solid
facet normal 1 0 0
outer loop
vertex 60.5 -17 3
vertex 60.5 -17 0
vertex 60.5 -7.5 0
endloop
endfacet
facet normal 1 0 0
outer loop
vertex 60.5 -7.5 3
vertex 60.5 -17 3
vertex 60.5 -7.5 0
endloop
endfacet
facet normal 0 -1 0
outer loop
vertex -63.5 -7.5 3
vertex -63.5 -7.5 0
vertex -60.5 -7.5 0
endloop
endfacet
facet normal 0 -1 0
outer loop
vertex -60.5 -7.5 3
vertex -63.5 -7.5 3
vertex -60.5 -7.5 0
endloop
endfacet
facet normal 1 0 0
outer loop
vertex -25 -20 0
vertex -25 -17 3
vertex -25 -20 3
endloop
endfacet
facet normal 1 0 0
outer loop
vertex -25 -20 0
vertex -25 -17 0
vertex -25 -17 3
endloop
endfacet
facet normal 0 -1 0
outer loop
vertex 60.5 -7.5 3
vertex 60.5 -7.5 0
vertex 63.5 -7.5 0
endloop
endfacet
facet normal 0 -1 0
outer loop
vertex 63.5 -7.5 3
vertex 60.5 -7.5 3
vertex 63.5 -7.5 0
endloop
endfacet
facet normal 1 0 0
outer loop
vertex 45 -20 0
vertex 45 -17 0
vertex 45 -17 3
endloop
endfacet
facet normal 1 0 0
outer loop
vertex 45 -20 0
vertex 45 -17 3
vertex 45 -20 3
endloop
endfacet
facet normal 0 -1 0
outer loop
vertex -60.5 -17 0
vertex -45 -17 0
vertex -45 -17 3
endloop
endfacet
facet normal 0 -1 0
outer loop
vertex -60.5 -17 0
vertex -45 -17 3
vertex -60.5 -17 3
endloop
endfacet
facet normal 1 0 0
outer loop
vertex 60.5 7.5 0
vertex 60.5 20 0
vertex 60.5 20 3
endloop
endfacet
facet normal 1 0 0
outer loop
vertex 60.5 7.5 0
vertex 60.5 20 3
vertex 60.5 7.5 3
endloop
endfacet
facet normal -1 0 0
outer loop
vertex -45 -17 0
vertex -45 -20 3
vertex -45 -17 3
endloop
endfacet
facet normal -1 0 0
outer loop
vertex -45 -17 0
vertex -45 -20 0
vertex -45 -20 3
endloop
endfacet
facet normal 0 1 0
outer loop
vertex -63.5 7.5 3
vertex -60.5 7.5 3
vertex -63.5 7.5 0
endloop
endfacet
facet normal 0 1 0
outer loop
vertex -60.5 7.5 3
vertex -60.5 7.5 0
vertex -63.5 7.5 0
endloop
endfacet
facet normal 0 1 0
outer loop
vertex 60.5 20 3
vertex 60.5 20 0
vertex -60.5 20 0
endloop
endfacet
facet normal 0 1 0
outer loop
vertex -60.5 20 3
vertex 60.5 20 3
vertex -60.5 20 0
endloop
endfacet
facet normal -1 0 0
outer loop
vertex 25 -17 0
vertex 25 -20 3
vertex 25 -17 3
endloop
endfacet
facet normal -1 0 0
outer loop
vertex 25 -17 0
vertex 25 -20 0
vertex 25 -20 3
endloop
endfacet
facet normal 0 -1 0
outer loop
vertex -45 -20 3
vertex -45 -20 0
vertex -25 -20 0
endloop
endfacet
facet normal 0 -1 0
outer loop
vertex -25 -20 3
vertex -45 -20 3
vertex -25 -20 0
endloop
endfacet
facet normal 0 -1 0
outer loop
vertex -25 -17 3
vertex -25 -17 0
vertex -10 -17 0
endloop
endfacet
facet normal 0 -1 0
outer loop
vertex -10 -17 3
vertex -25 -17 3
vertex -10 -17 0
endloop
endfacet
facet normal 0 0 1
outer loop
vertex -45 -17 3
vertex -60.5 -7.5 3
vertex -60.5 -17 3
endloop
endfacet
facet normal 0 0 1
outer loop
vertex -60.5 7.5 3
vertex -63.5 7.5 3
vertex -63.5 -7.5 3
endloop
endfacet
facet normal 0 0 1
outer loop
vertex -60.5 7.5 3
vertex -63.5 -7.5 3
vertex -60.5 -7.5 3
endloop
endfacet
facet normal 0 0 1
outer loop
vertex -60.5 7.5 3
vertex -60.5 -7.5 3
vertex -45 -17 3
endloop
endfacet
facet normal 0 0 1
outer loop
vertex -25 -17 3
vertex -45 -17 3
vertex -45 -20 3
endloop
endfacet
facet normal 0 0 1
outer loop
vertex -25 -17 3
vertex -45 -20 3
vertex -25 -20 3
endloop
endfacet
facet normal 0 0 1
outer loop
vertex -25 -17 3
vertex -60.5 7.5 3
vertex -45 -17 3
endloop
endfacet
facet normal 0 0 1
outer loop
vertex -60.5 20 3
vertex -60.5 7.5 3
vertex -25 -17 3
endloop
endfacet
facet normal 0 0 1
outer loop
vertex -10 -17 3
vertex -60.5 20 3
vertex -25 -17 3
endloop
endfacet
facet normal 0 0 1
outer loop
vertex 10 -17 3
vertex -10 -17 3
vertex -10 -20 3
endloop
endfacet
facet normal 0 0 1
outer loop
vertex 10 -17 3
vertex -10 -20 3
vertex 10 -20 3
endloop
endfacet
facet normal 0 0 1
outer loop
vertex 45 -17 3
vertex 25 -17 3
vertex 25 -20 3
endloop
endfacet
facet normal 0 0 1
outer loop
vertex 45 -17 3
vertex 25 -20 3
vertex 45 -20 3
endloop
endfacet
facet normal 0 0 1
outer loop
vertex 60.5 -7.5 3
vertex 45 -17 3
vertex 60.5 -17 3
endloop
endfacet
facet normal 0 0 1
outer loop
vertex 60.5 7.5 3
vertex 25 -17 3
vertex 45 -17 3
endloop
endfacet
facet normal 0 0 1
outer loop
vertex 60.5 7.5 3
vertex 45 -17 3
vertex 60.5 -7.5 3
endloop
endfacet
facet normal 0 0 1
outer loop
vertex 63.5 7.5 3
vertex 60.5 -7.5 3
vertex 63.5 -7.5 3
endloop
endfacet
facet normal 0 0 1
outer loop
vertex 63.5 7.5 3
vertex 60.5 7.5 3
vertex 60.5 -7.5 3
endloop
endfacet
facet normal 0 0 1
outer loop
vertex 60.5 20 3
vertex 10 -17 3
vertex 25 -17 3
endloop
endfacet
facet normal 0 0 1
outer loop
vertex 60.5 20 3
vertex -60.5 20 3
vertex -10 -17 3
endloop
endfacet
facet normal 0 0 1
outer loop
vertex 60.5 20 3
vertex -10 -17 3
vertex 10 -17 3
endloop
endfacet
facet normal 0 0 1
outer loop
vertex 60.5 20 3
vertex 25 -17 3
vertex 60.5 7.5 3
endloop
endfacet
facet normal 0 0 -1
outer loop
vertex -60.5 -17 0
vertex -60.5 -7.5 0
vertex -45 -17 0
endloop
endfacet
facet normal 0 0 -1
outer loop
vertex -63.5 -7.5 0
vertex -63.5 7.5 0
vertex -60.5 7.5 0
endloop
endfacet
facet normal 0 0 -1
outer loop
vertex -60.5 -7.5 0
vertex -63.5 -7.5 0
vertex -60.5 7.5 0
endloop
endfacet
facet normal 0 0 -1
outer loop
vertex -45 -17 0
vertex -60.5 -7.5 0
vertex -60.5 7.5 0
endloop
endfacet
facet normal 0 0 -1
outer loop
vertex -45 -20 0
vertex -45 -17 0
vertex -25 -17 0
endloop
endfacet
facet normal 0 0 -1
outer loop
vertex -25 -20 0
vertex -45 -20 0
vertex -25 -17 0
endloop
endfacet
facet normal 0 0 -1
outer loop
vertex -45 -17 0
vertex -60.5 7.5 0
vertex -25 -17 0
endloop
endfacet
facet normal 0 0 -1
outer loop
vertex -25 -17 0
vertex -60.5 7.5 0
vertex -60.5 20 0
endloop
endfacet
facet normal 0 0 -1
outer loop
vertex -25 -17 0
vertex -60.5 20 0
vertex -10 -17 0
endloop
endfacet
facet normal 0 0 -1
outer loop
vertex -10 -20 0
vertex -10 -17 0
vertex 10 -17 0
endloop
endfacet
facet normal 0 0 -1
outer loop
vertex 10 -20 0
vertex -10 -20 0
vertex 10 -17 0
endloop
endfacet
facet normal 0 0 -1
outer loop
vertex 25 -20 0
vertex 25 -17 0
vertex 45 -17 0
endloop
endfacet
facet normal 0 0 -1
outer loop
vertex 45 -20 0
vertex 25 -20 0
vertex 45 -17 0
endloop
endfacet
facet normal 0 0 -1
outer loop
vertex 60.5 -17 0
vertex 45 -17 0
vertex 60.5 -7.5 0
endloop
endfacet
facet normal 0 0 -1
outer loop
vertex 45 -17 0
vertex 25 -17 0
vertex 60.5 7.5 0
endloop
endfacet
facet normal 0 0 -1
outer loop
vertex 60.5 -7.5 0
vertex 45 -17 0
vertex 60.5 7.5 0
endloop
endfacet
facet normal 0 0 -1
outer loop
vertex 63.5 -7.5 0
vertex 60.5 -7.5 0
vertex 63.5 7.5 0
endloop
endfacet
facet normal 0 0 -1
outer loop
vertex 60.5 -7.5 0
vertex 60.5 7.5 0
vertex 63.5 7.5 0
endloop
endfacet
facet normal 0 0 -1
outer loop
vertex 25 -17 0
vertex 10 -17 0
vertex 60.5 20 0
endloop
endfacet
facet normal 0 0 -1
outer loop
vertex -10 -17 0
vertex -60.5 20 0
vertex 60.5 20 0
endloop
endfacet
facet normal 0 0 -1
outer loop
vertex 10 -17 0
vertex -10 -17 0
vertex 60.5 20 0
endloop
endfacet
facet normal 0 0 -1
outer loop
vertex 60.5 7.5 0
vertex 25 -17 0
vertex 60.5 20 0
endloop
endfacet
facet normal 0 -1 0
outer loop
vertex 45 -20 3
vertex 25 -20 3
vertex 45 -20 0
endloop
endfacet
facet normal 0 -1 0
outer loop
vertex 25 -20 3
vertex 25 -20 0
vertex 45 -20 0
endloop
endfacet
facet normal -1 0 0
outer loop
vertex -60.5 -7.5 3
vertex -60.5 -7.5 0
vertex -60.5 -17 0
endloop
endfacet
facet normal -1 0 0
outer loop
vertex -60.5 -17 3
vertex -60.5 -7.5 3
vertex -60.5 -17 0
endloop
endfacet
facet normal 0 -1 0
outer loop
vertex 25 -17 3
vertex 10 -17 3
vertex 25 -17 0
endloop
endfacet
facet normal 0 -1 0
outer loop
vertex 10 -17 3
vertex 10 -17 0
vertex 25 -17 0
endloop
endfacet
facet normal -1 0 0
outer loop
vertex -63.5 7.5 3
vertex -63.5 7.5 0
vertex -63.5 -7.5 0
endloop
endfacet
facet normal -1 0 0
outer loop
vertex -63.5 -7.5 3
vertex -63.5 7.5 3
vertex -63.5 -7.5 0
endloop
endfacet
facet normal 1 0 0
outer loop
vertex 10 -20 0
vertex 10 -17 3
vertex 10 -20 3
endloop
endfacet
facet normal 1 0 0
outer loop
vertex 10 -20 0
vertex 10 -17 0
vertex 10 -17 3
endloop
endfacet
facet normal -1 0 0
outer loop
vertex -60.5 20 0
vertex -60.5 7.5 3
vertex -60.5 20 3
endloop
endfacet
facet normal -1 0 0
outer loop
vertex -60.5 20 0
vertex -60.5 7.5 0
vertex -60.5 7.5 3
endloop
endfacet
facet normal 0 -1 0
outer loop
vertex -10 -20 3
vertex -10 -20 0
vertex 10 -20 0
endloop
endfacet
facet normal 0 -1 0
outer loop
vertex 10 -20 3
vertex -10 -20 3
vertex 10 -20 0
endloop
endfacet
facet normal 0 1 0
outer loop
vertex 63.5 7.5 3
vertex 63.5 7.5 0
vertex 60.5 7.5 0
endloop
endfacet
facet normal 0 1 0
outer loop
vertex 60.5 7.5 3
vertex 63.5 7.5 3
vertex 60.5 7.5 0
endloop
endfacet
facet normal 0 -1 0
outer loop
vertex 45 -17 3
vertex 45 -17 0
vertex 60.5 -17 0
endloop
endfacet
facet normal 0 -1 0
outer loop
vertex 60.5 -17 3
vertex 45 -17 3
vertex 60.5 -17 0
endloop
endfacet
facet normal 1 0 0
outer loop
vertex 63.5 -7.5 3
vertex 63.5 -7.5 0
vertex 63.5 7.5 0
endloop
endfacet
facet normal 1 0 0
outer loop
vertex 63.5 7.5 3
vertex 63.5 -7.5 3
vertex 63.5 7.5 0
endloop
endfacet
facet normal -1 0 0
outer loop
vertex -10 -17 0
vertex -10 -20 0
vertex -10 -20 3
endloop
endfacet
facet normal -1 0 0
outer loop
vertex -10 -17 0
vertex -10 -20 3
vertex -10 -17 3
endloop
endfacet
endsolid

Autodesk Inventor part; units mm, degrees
ref_plane "YZ Plane" through (0, 0, 0) normal (1, 0, 0) x (0, 1, 0)
ref_plane "XZ Plane" through (0, 0, 0) normal (0, 1, 0) x (-1, 0, 0)
ref_plane "XY Plane" through (0, 0, 0) normal (0, 0, 1) x (1, 0, 0)
sketch "Sketch1" plane through (0, 0, 0) normal (0, 0, 1) x (1, 0, 0)
  line L0 (-63.5, -20) -> (63.5, -20)
  line L1 (63.5, -20) -> (63.5, 20)
  line L2 (63.5, 20) -> (-63.5, 20)
  line L3 (-63.5, 20) -> (-63.5, -20)
  line L4 (-63.5, -20) -> (63.5, 20) construction
  line L5 (63.5, -20) -> (-63.5, 20) construction
  line L6 (-45, -17) -> (-25, -17) construction
  line L7 (-25, -17) -> (-25, -20)
  line L8 (-25, -20) -> (-45, -20)
  line L9 (-45, -20) -> (-45, -17)
  line L10 (-45, -17) -> (-25, -20) construction
  line L11 (-25, -17) -> (-45, -20) construction
  line L12 (-10, -17) -> (10, -17) construction
  line L13 (10, -17) -> (10, -20)
  line L14 (10, -20) -> (-10, -20)
  line L15 (-10, -20) -> (-10, -17)
  line L16 (-10, -17) -> (10, -20) construction
  line L17 (10, -17) -> (-10, -20) construction
  line L18 (25, -17) -> (45, -17) construction
  line L19 (45, -17) -> (45, -20)
  line L20 (45, -20) -> (25, -20)
  line L21 (25, -20) -> (25, -17)
  line L22 (25, -17) -> (45, -20) construction
  line L23 (45, -17) -> (25, -20) construction
  line L24 (-45, -17) -> (-63.5, -17)
  line L25 (-25, -17) -> (-10, -17)
  line L26 (10, -17) -> (25, -17)
  line L27 (45, -17) -> (63.5, -17)
  line L28 (-63.5, -7.5) -> (-60.5, -7.5)
  line L29 (-60.5, -7.5) -> (-60.5, 7.5) construction
  line L30 (-60.5, 7.5) -> (-63.5, 7.5)
  line L31 (-63.5, 7.5) -> (-63.5, -7.5)
  line L32 (-63.5, -7.5) -> (-60.5, 7.5) construction
  line L33 (-60.5, -7.5) -> (-63.5, 7.5) construction
  line L34 (-60.5, 7.5) -> (-60.5, 20)
  line L35 (-60.5, -7.5) -> (-60.5, -17)
  point P0 (0, 0)
  point P1 (-35, -18.5)
  point P2 (0, -18.5)
  point P3 (35, -18.5)
  point P4 (0, -20)
  point P5 (-62, 0)
  point P6 (-63.5, 0)
  point P7 (-63.5, -7.5)
  dimension "d0" = 127
  dimension "d1" = 40
  dimension "d2" = 20
  dimension "d3" = 3
  dimension "d4" = 20
  dimension "d5" = 3
  dimension "d6" = 20
  dimension "d7" = 3
  dimension "d8" = 35
  dimension "d9" = 35
  dimension "d10" = 15
  dimension "d11" = 3
extrude "Extrusion1" add sketch "Sketch1" along normal blind 3 contours L9 L24 L35 L28 L3 L30 L34 L2 L1 L27 L19 L0 L21 L26 L13 L15 L25 L7 | L3 L28 L35 L24 | L3 L2 L34 L30
extrude "Extrusion2" cut sketch "Sketch1" along normal through all contours L3 L28 L35 L24 | L3 L2 L34 L30
mirror "Mirror1" about plane through (0, 0, 0) normal (1, 0, 0) of "Extrusion2"
equation "\"d4\" = d2"
equation "\"d5\" = d3"
equation "\"d6\" = d2"
equation "\"d7\" = d5"
equation "\"d9\" = d8"
equation "\"d11\" = d3"
properties part number "bed_acrylic_lower_front"
